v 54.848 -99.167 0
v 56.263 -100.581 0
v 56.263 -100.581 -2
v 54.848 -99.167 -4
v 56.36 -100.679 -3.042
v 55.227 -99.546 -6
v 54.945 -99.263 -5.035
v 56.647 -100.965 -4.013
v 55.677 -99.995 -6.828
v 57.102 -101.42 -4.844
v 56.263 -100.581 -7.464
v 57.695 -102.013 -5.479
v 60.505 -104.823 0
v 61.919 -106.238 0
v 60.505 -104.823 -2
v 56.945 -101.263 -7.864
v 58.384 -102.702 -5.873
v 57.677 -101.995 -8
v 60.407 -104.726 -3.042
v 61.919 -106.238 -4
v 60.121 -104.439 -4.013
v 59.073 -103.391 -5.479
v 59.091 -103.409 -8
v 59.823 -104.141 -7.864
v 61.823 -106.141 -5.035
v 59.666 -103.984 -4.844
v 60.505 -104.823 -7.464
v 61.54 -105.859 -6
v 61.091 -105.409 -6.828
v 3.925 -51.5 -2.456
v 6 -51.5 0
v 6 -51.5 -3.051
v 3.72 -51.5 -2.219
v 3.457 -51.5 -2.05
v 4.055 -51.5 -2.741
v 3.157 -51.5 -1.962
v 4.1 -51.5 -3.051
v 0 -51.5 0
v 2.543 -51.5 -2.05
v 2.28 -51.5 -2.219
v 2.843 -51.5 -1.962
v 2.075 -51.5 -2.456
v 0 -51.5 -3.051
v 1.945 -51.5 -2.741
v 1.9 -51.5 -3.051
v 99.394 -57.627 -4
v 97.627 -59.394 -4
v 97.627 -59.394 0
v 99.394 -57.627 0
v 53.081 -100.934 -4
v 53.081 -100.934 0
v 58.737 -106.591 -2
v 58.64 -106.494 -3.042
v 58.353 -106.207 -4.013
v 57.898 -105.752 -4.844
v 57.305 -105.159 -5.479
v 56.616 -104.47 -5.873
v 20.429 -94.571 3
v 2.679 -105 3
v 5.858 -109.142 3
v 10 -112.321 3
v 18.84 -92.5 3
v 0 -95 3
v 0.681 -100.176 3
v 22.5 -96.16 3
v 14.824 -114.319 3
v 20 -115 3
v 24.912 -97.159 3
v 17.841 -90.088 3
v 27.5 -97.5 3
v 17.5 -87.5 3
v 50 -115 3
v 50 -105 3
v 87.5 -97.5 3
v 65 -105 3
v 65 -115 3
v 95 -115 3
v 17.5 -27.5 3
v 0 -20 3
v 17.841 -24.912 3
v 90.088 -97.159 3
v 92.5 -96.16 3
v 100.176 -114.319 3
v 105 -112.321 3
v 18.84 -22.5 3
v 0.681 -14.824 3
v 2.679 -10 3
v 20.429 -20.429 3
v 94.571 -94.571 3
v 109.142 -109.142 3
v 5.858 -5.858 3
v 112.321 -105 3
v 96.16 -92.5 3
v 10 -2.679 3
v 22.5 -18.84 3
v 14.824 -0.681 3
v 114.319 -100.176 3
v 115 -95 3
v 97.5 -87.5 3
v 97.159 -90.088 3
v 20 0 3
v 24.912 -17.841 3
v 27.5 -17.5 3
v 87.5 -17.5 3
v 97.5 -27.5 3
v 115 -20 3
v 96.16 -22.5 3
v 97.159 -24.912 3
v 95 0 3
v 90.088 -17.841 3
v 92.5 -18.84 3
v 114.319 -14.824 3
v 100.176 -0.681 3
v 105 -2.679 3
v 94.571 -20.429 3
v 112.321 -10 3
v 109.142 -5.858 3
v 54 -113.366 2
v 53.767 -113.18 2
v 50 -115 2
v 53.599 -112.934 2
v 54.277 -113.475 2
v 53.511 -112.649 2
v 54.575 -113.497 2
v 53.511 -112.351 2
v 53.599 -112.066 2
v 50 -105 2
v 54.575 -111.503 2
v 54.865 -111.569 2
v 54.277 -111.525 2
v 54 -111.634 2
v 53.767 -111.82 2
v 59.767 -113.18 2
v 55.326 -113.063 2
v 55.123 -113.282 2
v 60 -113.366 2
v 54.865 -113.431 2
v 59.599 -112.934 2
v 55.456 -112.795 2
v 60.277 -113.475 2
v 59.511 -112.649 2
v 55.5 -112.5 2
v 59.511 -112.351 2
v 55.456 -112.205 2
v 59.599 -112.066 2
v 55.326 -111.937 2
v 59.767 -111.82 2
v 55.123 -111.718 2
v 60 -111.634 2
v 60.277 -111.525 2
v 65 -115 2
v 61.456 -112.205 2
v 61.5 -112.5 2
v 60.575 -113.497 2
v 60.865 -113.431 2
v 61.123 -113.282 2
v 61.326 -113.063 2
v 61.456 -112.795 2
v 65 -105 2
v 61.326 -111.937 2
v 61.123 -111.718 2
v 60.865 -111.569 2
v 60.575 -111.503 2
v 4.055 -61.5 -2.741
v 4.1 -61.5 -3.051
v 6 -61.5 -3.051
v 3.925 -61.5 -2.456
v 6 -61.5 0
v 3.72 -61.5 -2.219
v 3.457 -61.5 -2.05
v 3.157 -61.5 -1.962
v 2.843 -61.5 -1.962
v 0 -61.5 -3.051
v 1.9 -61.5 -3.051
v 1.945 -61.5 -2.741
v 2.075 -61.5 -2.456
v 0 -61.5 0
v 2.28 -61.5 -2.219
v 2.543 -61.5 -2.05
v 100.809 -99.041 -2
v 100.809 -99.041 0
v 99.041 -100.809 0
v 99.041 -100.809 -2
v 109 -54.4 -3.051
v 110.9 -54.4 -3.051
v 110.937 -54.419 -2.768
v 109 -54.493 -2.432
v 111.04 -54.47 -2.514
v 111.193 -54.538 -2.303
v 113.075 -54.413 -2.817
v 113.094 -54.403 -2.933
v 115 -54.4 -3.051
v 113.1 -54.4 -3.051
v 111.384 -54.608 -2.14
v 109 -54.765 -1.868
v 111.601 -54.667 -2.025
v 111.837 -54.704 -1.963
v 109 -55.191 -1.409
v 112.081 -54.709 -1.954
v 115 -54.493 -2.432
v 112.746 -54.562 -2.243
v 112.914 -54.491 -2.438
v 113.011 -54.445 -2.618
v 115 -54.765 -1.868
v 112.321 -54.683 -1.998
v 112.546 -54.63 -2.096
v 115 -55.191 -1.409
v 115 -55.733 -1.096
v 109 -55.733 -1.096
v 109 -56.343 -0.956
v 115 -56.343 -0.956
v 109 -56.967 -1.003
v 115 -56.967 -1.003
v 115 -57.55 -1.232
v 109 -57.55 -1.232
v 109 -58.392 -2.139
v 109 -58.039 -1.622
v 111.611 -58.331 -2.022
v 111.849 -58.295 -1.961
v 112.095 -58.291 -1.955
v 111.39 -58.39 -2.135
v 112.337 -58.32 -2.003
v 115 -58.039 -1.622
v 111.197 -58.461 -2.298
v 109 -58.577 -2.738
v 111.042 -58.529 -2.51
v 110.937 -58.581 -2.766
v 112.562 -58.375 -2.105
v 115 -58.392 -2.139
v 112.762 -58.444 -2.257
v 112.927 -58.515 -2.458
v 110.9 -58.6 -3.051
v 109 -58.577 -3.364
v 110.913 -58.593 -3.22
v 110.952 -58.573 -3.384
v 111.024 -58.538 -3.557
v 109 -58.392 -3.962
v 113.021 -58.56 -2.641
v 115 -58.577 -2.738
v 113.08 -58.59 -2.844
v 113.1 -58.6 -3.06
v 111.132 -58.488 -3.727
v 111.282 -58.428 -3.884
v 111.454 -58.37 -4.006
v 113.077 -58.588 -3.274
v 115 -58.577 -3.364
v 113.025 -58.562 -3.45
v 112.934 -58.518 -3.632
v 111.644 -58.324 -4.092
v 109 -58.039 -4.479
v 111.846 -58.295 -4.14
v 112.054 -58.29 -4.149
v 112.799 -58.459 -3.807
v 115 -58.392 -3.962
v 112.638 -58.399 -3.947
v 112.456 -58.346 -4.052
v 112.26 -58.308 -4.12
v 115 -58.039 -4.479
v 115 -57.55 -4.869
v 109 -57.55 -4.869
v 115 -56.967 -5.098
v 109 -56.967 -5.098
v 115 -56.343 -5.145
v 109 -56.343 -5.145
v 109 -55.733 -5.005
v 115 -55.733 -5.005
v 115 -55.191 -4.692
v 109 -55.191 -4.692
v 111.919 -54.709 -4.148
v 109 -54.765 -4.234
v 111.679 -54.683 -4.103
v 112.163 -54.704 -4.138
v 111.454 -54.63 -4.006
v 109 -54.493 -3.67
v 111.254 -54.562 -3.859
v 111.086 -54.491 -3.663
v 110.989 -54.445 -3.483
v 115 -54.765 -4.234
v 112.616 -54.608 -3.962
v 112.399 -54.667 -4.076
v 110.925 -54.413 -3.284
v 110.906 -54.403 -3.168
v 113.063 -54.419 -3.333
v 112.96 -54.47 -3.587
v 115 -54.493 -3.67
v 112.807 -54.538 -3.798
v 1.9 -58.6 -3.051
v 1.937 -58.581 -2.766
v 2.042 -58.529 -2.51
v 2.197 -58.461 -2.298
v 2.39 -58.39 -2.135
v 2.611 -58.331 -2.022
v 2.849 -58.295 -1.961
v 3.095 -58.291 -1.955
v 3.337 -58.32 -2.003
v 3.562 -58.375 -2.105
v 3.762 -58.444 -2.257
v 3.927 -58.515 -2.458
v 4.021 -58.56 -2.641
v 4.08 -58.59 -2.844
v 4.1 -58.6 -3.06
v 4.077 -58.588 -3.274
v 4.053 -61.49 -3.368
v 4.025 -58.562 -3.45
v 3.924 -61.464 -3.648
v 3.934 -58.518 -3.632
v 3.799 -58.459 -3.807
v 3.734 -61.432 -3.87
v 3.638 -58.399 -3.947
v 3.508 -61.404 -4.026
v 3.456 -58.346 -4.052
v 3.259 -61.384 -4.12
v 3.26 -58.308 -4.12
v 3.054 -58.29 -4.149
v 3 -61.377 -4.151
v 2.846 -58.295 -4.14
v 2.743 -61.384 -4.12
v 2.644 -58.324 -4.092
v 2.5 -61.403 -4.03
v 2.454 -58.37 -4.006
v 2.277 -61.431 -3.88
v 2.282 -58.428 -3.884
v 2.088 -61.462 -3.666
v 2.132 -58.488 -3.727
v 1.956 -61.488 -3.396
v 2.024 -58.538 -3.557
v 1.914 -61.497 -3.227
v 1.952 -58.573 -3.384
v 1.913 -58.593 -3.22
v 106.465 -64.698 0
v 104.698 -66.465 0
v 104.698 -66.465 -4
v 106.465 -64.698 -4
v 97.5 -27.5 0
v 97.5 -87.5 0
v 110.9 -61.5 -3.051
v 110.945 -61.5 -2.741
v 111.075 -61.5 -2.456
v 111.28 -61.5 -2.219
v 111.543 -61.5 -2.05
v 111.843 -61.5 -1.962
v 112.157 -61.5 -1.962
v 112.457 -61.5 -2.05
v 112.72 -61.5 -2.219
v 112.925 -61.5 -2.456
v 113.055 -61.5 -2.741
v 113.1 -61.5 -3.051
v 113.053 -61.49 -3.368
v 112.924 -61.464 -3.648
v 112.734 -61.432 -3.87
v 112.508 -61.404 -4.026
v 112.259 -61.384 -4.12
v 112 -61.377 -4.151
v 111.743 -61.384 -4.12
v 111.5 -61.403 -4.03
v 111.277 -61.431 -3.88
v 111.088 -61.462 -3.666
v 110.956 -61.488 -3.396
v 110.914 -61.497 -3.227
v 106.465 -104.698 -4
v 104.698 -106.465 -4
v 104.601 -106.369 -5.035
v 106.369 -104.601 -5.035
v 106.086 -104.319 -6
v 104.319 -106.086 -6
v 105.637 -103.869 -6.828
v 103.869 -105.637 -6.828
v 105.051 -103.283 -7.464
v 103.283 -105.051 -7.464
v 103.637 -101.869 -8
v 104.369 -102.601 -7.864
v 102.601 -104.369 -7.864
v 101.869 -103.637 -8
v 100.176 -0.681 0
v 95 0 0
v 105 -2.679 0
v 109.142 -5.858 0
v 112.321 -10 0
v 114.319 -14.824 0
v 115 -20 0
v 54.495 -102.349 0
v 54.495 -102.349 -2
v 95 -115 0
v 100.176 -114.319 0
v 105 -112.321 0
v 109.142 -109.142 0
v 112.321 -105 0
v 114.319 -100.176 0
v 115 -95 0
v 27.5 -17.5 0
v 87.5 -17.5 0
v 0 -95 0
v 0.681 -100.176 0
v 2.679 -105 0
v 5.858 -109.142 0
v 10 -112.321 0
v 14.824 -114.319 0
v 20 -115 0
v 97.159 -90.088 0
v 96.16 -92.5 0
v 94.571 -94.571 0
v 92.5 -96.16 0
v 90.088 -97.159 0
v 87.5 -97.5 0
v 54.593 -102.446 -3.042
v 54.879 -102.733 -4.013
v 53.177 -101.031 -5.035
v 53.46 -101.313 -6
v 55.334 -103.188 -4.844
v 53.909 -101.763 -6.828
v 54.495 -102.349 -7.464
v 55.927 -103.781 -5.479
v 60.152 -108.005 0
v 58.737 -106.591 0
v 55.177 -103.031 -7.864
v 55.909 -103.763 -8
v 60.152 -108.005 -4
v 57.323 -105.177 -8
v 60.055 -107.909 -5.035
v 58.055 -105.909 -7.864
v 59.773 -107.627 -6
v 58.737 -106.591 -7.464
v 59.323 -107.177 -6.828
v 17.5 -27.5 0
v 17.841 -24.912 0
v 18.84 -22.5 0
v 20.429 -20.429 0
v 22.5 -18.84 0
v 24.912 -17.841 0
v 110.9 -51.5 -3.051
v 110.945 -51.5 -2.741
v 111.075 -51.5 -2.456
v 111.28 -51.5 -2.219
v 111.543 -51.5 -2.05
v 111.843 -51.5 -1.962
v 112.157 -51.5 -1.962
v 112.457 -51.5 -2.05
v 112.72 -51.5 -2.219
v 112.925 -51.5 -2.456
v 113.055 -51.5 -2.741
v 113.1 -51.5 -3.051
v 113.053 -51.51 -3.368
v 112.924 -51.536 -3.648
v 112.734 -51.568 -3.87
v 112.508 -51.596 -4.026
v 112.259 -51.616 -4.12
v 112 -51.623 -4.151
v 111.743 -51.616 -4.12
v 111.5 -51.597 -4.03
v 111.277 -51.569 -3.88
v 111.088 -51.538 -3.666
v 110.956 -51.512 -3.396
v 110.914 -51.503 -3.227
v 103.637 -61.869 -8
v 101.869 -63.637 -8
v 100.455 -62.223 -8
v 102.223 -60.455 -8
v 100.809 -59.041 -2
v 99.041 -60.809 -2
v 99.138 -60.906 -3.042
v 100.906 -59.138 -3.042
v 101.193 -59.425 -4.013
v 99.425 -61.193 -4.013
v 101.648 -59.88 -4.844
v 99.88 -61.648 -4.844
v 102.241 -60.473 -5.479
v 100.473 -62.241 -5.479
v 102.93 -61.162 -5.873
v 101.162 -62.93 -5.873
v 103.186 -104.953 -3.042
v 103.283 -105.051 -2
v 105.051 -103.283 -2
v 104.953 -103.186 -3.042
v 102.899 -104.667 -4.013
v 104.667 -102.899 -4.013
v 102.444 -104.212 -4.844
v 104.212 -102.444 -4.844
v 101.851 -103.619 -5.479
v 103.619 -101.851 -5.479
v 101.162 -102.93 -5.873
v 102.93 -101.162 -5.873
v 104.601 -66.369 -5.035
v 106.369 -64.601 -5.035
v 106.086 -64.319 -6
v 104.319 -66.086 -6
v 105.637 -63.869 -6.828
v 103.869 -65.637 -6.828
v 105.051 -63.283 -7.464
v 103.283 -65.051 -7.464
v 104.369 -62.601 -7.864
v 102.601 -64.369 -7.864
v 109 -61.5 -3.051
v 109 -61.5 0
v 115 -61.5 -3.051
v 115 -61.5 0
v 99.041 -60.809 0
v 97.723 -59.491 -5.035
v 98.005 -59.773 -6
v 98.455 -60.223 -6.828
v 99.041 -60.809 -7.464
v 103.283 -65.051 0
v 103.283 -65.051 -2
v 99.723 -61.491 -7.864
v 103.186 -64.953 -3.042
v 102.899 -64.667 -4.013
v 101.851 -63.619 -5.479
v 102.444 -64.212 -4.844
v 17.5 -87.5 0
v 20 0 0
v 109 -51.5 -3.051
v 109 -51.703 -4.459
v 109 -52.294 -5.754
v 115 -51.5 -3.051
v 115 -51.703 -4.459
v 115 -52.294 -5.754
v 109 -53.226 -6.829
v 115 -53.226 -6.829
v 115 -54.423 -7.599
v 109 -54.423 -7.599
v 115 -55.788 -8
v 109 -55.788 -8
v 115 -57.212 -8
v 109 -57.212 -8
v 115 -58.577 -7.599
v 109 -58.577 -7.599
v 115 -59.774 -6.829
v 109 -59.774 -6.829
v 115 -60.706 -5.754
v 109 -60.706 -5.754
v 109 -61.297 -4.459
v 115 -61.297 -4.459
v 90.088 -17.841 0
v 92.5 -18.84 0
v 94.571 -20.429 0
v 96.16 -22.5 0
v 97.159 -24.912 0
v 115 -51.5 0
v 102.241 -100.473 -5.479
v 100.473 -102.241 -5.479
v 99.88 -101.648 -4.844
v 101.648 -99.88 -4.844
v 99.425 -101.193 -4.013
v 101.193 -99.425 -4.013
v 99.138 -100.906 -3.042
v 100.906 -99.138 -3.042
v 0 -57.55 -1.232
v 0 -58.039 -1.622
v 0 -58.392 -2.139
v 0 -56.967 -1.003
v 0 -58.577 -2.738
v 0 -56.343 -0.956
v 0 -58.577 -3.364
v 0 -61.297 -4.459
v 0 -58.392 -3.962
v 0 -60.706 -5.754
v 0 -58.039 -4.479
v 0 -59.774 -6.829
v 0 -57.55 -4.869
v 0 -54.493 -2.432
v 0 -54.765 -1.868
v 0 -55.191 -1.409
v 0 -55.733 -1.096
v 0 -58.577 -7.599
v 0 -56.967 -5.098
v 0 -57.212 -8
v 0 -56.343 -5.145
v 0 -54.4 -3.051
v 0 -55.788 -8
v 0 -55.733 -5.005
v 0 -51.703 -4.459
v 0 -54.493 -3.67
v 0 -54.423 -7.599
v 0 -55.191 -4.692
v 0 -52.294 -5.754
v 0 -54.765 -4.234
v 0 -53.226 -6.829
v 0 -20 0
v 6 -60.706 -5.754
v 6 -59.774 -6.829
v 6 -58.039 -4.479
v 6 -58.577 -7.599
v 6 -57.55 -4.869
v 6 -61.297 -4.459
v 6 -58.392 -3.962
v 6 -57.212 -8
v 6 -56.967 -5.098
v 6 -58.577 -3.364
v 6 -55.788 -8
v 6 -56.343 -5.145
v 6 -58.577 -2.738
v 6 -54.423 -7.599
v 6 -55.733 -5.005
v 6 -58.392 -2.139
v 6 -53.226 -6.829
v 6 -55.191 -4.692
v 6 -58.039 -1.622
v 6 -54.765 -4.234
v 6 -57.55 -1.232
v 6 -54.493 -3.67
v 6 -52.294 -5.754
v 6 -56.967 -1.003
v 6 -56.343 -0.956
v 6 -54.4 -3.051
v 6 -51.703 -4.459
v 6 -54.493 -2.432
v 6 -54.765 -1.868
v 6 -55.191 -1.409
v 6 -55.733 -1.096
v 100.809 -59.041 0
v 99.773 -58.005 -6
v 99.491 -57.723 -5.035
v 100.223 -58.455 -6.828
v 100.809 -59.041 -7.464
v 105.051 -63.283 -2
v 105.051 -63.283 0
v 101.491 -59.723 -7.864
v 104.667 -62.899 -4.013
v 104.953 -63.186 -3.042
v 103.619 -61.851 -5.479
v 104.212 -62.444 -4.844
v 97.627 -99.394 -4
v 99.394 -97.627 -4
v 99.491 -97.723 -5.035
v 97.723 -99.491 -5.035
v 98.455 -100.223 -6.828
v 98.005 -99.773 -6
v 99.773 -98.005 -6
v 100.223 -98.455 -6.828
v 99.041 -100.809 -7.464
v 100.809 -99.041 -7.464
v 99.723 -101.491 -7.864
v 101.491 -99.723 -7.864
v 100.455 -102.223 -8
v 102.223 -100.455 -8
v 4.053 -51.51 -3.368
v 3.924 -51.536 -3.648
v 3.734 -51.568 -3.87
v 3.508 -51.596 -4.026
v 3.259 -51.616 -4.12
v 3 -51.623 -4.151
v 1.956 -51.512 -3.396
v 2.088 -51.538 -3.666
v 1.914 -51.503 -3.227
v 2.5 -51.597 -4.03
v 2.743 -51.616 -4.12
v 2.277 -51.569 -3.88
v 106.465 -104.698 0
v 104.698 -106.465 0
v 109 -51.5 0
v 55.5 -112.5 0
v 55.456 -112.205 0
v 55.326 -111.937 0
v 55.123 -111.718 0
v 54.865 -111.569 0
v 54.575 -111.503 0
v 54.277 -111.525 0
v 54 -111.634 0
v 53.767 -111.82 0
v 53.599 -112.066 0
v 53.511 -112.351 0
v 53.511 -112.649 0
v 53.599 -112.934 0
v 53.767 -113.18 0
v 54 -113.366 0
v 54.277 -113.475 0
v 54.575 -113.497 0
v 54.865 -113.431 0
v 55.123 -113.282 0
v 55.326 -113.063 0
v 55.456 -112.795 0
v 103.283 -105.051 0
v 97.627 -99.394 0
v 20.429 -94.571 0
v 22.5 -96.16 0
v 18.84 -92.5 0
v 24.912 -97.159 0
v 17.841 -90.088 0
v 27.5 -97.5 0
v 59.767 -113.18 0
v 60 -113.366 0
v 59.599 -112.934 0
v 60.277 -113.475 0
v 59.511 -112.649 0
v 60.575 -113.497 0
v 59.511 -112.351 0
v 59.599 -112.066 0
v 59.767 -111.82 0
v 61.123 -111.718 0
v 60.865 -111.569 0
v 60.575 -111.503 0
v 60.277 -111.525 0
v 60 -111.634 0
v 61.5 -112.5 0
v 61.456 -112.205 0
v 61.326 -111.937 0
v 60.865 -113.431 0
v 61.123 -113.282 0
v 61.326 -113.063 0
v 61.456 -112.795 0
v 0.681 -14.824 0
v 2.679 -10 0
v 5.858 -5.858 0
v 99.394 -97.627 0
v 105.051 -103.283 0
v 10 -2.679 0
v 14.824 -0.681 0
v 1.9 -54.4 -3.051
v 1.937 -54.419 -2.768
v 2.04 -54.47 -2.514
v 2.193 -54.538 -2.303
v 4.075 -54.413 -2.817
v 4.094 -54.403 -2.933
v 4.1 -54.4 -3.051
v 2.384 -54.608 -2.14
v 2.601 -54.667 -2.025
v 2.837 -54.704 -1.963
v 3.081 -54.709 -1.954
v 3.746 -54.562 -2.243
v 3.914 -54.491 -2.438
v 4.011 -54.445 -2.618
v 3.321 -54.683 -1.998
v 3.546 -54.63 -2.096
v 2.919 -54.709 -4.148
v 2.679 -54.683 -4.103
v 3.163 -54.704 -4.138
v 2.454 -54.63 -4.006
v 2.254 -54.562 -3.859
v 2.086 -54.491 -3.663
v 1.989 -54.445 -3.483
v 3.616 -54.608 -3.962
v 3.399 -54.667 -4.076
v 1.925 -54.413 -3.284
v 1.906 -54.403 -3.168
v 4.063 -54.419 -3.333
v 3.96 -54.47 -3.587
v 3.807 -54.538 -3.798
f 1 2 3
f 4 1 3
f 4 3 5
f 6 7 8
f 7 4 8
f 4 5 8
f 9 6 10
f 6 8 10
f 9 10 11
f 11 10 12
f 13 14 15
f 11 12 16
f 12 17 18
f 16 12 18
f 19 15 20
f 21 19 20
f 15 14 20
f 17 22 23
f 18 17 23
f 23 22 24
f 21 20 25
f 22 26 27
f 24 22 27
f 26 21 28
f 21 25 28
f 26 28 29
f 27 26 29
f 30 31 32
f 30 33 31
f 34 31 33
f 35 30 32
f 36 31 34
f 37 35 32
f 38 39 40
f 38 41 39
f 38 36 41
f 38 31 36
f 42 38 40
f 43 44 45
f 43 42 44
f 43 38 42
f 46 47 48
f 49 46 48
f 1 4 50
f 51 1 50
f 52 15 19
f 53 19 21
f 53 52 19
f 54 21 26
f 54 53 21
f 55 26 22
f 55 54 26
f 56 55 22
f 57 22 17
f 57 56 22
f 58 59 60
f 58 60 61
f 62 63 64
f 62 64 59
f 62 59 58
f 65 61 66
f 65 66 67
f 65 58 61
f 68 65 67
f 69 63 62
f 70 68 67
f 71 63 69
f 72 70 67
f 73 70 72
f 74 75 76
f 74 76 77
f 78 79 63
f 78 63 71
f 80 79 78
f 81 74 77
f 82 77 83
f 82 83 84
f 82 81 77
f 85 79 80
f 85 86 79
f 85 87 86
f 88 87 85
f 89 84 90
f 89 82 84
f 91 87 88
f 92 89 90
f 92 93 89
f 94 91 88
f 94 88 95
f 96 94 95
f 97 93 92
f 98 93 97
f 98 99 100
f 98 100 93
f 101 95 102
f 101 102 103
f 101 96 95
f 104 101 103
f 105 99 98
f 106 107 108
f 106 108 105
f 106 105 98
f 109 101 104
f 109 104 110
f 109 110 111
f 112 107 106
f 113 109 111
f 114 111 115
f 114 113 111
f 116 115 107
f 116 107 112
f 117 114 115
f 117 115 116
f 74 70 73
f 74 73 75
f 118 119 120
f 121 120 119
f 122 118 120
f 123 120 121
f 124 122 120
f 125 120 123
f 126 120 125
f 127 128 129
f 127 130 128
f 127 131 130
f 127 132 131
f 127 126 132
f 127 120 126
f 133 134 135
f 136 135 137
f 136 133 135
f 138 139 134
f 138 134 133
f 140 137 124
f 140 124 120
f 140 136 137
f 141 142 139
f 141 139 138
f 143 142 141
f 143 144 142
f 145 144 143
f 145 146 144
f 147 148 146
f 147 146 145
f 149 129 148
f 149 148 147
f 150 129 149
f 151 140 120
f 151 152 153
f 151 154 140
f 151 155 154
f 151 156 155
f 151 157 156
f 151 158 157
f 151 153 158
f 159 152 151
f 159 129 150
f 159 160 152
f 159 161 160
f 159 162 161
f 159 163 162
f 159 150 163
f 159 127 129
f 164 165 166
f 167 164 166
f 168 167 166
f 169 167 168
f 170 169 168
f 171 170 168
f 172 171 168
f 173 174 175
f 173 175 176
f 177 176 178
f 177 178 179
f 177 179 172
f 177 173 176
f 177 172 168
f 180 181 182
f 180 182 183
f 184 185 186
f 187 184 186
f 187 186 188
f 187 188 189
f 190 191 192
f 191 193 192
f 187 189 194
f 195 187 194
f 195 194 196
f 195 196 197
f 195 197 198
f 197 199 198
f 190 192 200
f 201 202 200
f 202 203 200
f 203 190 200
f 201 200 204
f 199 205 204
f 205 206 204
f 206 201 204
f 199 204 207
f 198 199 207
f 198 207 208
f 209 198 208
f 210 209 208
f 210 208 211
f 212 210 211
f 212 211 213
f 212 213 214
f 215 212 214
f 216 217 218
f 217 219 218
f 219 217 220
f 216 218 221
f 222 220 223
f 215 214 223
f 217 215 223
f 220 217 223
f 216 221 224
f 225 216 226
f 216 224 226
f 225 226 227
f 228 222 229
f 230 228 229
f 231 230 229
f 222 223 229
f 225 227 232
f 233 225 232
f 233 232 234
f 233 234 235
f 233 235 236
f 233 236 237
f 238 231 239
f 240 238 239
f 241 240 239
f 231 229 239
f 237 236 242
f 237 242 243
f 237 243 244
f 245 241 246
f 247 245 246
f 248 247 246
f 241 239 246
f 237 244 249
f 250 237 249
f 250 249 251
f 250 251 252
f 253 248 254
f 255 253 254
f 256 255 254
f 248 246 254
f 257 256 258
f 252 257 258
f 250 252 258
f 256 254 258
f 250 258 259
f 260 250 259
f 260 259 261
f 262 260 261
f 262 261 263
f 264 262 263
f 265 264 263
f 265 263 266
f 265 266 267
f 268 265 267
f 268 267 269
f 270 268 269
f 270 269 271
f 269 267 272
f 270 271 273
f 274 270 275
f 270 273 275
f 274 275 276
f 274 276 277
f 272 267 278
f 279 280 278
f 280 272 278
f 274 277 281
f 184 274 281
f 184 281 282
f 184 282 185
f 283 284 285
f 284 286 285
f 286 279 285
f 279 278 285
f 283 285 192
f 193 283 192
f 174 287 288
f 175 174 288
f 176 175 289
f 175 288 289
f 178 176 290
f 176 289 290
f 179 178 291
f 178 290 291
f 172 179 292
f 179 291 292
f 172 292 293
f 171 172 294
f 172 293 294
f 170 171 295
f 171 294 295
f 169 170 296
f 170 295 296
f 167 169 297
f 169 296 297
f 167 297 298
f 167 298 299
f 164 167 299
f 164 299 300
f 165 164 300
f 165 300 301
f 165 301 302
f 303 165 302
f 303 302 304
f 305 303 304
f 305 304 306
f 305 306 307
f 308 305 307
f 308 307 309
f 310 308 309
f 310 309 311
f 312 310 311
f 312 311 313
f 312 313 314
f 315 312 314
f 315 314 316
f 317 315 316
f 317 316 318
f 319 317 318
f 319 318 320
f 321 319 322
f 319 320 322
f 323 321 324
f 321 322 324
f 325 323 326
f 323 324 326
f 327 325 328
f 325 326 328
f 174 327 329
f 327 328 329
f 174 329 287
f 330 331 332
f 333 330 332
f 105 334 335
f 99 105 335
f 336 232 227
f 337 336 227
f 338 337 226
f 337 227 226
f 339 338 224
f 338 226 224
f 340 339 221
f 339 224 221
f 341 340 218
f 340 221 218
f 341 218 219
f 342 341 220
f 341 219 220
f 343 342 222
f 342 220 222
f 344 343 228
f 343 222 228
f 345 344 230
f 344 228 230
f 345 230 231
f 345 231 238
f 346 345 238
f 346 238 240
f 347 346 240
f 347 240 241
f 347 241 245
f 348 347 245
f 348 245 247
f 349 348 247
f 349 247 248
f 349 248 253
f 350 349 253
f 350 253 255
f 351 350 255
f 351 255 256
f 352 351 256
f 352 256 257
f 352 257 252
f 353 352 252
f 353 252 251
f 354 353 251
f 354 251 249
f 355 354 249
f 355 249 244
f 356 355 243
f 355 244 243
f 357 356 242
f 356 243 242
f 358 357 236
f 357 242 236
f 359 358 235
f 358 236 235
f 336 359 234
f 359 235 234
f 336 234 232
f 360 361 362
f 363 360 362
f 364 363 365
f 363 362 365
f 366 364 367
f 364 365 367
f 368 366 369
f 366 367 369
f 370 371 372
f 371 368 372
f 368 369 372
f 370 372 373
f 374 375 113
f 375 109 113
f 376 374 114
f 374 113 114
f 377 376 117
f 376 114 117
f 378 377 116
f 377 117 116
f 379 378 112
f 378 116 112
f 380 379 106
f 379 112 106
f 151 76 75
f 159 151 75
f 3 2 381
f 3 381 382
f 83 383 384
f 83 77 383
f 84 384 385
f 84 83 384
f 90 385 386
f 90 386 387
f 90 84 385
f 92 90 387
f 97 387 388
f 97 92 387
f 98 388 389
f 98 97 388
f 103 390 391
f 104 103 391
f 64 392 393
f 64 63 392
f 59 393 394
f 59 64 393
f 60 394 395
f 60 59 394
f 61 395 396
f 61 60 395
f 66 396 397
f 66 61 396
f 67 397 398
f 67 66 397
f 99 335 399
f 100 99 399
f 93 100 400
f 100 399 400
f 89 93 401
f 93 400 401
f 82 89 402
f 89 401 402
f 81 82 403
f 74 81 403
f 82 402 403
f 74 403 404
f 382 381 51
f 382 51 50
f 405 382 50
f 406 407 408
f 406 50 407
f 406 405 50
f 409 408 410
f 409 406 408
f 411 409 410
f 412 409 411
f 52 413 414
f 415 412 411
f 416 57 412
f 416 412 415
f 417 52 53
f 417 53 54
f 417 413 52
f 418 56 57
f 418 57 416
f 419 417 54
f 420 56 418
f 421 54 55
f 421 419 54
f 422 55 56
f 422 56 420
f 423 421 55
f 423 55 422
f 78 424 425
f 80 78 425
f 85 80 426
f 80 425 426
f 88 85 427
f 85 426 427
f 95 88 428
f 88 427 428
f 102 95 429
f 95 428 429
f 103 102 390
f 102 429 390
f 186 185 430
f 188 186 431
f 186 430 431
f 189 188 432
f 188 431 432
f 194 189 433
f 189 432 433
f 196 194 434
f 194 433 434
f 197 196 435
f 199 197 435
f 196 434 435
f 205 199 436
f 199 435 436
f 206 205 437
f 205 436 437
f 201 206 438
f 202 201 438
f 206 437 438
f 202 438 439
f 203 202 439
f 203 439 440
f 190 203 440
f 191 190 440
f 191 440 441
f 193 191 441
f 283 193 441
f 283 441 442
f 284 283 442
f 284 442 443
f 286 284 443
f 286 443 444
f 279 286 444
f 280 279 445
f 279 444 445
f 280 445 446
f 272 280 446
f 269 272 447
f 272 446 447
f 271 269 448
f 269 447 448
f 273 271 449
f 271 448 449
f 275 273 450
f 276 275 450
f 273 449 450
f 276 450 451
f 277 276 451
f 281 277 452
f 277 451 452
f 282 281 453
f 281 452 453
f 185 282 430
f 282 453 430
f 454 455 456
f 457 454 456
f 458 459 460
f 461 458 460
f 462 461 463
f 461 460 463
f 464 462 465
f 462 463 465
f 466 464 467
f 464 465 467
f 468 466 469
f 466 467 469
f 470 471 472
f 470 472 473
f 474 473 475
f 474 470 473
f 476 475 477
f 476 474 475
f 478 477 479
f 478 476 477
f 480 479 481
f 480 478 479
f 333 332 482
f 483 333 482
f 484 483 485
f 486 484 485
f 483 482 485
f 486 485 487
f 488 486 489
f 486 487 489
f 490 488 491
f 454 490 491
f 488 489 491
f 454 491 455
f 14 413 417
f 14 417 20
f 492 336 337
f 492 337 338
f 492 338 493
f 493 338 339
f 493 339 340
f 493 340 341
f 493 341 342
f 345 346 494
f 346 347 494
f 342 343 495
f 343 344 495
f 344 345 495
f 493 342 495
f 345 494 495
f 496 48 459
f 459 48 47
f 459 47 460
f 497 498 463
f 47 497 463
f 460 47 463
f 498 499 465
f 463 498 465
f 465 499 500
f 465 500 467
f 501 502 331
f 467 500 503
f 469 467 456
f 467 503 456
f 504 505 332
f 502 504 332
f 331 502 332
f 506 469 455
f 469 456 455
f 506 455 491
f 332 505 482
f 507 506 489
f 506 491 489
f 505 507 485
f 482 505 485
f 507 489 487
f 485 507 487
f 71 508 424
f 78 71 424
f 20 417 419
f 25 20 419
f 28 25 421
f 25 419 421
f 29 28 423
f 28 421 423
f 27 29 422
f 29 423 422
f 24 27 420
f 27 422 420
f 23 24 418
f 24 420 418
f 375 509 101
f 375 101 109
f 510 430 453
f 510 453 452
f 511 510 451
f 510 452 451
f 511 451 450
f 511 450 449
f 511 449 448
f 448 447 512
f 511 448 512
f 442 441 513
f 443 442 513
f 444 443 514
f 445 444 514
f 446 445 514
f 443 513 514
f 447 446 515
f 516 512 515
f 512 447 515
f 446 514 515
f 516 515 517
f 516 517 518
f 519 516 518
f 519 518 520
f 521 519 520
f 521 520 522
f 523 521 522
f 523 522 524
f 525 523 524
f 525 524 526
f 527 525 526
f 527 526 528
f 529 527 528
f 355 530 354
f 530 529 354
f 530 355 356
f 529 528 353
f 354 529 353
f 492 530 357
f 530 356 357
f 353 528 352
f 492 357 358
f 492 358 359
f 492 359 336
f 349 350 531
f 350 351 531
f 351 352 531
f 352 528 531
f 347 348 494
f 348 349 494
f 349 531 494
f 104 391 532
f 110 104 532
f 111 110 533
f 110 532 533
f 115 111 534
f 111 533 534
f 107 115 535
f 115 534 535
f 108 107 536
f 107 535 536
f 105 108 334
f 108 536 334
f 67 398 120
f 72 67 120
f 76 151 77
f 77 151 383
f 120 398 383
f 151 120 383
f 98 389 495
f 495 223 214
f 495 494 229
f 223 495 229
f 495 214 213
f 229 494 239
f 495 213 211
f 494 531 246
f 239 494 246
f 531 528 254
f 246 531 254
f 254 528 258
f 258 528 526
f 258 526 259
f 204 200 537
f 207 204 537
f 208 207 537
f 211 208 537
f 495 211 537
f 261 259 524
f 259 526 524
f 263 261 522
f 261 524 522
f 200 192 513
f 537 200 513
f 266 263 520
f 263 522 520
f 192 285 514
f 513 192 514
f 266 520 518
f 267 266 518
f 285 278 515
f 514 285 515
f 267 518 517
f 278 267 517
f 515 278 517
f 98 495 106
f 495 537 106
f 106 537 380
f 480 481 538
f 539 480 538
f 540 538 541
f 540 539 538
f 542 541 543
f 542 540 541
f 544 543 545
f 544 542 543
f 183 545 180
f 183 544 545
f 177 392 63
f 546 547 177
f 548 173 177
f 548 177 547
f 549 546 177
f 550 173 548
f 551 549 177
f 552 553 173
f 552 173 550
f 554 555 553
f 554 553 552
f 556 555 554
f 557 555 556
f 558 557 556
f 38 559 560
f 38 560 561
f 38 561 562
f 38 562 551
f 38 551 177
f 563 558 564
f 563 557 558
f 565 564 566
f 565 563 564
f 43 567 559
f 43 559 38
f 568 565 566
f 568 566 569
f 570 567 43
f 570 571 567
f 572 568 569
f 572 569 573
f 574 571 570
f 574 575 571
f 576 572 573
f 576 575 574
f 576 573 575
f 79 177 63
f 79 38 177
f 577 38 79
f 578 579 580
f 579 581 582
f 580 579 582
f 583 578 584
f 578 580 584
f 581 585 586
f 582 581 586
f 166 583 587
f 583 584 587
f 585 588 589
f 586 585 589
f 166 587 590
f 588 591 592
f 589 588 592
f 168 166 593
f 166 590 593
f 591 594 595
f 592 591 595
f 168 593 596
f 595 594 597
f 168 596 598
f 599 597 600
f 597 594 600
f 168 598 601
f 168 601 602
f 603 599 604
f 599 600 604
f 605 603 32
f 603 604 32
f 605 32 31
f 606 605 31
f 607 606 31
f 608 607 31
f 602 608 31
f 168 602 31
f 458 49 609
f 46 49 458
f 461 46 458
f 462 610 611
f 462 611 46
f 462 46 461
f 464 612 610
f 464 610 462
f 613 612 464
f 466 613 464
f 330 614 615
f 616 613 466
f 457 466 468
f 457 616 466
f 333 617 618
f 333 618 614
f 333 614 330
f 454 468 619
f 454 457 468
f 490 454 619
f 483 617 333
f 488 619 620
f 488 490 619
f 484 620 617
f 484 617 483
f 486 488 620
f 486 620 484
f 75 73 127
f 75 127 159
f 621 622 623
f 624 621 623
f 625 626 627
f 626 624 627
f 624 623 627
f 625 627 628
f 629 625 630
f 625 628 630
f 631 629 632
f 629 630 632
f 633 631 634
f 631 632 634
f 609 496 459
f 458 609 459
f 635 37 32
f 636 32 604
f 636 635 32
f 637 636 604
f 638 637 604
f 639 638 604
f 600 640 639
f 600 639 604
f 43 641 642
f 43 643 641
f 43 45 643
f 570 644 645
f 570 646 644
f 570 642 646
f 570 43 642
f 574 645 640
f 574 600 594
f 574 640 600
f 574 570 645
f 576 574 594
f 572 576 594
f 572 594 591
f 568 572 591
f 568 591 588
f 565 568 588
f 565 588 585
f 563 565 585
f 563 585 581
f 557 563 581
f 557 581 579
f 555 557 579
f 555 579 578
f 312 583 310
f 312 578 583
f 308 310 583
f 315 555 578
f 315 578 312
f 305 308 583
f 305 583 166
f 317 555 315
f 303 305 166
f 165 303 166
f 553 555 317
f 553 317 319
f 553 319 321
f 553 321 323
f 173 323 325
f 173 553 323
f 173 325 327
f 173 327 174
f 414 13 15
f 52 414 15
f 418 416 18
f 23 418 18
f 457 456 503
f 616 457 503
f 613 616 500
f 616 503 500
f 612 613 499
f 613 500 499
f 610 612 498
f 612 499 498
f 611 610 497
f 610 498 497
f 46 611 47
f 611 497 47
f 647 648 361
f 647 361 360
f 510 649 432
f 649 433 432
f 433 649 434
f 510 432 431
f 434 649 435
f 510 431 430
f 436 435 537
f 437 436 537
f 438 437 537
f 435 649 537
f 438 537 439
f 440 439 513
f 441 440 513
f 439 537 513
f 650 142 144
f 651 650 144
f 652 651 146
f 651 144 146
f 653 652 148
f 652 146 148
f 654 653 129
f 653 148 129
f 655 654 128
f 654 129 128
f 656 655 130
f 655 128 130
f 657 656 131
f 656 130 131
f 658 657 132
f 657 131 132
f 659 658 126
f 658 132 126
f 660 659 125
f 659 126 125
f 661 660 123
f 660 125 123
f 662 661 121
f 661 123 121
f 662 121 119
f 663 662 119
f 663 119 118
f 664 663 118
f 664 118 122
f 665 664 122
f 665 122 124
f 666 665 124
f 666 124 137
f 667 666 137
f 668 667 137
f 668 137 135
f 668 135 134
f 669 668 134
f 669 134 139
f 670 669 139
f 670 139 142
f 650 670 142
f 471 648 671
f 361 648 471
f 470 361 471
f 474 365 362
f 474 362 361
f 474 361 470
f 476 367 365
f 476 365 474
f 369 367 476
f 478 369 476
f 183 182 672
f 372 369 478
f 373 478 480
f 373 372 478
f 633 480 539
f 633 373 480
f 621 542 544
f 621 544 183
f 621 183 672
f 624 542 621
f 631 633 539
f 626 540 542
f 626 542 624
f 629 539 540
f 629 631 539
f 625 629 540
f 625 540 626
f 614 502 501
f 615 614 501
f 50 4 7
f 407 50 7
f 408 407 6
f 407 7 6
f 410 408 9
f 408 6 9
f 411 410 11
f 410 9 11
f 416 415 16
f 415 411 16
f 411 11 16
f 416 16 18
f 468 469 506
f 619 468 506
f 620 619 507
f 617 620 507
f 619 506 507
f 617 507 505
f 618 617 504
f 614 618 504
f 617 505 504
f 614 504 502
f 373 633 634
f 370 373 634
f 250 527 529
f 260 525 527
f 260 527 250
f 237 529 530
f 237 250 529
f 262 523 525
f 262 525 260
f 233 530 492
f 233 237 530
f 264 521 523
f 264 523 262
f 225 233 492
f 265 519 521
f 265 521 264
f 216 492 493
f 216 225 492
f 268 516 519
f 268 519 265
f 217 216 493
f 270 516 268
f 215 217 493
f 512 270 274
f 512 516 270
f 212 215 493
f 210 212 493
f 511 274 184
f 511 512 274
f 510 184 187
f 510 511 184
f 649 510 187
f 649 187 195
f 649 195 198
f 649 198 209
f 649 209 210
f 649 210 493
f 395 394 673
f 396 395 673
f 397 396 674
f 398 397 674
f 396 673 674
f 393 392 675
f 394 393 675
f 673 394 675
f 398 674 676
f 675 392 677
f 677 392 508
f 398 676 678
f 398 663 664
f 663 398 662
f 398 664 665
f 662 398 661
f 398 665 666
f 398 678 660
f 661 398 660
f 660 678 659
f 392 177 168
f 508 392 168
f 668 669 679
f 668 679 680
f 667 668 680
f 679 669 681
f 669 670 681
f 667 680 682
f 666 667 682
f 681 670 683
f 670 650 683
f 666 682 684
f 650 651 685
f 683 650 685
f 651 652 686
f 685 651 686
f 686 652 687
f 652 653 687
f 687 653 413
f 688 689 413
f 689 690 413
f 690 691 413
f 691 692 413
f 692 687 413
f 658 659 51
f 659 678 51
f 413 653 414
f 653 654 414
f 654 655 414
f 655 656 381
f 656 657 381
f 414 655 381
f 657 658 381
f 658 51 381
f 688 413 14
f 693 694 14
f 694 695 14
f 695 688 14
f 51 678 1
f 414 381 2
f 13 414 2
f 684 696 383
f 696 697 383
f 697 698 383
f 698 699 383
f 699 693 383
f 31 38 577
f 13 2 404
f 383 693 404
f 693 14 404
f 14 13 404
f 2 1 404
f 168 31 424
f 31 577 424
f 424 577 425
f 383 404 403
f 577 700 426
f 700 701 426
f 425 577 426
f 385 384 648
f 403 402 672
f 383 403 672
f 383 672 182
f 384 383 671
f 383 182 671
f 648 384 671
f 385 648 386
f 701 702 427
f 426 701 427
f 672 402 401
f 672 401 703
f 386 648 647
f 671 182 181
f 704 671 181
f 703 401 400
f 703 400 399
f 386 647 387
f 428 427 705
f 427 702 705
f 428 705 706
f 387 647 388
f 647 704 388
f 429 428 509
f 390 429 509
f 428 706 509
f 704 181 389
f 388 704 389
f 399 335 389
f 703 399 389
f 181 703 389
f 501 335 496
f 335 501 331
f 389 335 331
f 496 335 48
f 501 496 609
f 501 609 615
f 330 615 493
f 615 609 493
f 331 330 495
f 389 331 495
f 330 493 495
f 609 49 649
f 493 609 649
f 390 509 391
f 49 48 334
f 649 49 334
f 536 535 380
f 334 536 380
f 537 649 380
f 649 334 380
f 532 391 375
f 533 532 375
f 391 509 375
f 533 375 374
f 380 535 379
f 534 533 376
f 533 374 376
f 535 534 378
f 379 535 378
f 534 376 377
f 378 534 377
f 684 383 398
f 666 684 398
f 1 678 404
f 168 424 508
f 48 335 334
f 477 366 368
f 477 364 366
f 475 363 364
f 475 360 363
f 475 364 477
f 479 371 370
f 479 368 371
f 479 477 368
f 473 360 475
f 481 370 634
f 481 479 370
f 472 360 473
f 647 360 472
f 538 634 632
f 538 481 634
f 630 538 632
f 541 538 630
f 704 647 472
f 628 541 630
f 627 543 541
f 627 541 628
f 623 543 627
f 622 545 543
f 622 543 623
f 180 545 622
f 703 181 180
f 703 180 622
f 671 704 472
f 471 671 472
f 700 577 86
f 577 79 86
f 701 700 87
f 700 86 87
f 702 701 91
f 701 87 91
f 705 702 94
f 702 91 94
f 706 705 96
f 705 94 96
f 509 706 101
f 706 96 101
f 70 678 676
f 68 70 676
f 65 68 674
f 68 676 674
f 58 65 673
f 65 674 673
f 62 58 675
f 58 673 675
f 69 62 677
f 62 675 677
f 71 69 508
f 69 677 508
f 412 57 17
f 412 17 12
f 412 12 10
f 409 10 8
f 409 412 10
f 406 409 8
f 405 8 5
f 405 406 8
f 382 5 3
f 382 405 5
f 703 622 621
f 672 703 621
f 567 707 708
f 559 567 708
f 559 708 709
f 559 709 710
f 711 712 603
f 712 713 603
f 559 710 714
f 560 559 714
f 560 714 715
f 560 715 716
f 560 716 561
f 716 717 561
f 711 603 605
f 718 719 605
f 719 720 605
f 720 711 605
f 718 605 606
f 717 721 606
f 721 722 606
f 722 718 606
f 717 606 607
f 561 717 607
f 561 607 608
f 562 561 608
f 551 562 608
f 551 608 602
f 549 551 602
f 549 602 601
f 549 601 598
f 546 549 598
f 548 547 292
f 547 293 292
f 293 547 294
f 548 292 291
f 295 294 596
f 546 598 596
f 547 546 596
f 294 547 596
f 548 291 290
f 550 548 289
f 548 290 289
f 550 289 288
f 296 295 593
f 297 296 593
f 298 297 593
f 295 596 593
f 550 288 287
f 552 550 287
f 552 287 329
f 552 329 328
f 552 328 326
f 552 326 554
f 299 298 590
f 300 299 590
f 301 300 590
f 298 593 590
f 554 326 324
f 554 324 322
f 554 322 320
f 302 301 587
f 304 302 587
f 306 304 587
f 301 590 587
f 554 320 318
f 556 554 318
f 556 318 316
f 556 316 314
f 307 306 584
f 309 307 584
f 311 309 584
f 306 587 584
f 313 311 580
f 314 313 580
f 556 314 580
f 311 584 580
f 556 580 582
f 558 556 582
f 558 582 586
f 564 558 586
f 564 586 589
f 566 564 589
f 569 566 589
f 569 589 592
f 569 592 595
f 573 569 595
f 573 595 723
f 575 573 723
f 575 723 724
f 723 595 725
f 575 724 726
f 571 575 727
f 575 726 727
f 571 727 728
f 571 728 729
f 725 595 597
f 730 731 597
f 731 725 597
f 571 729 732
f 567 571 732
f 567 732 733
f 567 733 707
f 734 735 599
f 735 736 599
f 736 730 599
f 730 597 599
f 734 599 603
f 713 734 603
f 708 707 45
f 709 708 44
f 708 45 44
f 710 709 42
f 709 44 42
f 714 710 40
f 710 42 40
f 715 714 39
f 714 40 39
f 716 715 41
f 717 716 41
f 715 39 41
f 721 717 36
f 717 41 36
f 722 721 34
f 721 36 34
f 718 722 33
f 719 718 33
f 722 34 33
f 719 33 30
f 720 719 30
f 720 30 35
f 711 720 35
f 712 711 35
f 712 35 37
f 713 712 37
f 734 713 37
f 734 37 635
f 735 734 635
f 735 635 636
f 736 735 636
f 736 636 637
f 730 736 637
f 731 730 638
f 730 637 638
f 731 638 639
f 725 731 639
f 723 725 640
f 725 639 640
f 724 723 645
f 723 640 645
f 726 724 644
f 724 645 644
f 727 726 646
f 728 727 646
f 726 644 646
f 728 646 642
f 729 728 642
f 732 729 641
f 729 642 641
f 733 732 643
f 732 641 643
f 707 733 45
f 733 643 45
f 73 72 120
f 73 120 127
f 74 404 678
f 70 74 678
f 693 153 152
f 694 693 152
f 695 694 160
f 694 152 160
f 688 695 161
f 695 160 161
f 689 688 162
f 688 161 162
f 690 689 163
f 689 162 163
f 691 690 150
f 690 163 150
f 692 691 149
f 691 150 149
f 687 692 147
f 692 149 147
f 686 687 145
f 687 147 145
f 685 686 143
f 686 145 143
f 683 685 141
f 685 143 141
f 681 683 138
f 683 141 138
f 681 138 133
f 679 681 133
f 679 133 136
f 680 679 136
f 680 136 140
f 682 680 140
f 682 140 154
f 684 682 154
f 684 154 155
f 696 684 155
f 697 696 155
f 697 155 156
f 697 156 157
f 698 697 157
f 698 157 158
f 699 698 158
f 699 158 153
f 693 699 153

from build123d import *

# Parameters (mm, degrees)
SZKIC1_W                    = 115
SZKIC1_H                    = 115
DODANIE_WYCI_GNI_CIE1_DEPTH = 3
DODANIE_WYCI_GNI_CIE2_DEPTH = 6
SZKIC5_R                    = 2.1
WYTNIJ_WYCI_GNI_CIE1_DEPTH  = 163.833695476
SZKIC6_R                    = 1
WYTNIJ_WYCI_GNI_CIE2_DEPTH  = 10
ZAOKR_GLENIE1_R             = 20
SZKIC7_W                    = 15
SZKIC7_H                    = 10
WYTNIJ_WYCI_GNI_CIE3_DEPTH  = 1
WYTNIJ_WYCI_GNI_CIE4_DEPTH  = 10
SZKIC9_R                    = 1.1
WYTNIJ_WYCI_GNI_CIE5_DEPTH  = 132.613306252
SZKIC10_R                   = 1.1
WYTNIJ_WYCI_GNI_CIE6_DEPTH  = 10
DODANIE_WYCI_GNI_CIE4_DEPTH = 8
SZKIC14_W                   = 6
SZKIC14_H                   = 6
WYTNIJ_WYCI_GNI_CIE8_DEPTH  = 8
ZAOKR_GLENIE3_R             = 4
DODANIE_WYCI_GNI_CIE5_DEPTH = 8
SZKIC16_W                   = 6
SZKIC16_H                   = 6
WYTNIJ_WYCI_GNI_CIE9_DEPTH  = 8
ZAOKR_GLENIE5_R             = 4
SZYK_START                  = 27.034271247
SZYK_LINIOWY1_DEPTH         = 2.5


# Read off the part's stored shape, not the designer's step: Szyk liniowy1
with BuildPart() as part:
    # Szkic1 → Dodanie-wyciągnięcie1 (new body)
    with BuildSketch(Plane.XY):
        with Locations((57.5, -57.5)):
            Rectangle(SZKIC1_W, SZKIC1_H)
    extrude(amount=DODANIE_WYCI_GNI_CIE1_DEPTH)

    # Szkic3 → Dodanie-wyciągnięcie2 (add)
    with BuildSketch(Plane(origin=(115, 0, 0), x_dir=(0, 0, -1), z_dir=(1, 0, 0))):
        with BuildLine():
            Line((0, -51.5), (3.050613798, -51.5))
            ThreePointArc((3.050613798, -51.5), (8.050613798, -56.5), (3.050613798, -61.5))
            Line((3.050613798, -61.5), (0, -61.5))
            Line((0, -61.5), (0, -51.5))
        make_face()
    dodanie_wyci_gni_cie2 = extrude(amount=-DODANIE_WYCI_GNI_CIE2_DEPTH)

    # Lustro1: Dodanie-wyciągnięcie2 across plane
    add(dodanie_wyci_gni_cie2.mirror(Plane(origin=(57.5, 0, 0), x_dir=(0, 0, 1), z_dir=(1, 0, 0))))

    # Szkic5 → Wytnij-wyciągnięcie1 (cut, through all)
    with BuildSketch(Plane(origin=(115, 0, 0), x_dir=(0, 0, -1), z_dir=(1, 0, 0))):
        with Locations(Location((3.050613798, -56.5, 0), (0, 0, 90))):
            Circle(SZKIC5_R)
    extrude(amount=-WYTNIJ_WYCI_GNI_CIE1_DEPTH, mode=Mode.SUBTRACT)

    # Szkic6 → Wytnij-wyciągnięcie2 (cut)
    with BuildSketch(Plane.XY.offset(3)):
        with Locations((54.5, -112.5)):
            Circle(SZKIC6_R)
        with Locations((60.5, -112.5)):
            Circle(SZKIC6_R)
    extrude(amount=-WYTNIJ_WYCI_GNI_CIE2_DEPTH, mode=Mode.SUBTRACT)

    # Zaokrąglenie1
    zaokr_glenie1_edges = [part.edges().sort_by_distance(p)[0] for p in [
        (0, 0, 1.5),
        (115, 0, 1.5),
        (115, -115, 1.5),
        (0, -115, 1.5),
    ]]
    fillet(zaokr_glenie1_edges, radius=ZAOKR_GLENIE1_R)

    # Szkic7 → Wytnij-wyciągnięcie3 (cut)
    with BuildSketch(Plane.XY.offset(3)):
        with Locations((57.5, -110)):
            Rectangle(SZKIC7_W, SZKIC7_H)
    extrude(amount=-WYTNIJ_WYCI_GNI_CIE3_DEPTH, mode=Mode.SUBTRACT)

    # Szkic8 → Wytnij-wyciągnięcie4 (cut)
    with BuildSketch(Plane(origin=(0, 0, 0), x_dir=(-1, 0, 0), z_dir=(0, 0, -1))):
        with BuildLine():
            Line((-87.5, -97.5), (-27.5, -97.5))
            ThreePointArc((-27.5, -97.5), (-20.428932188, -94.571067812), (-17.5, -87.5))
            Line((-17.5, -87.5), (-17.5, -27.5))
            ThreePointArc((-17.5, -27.5), (-20.428932188, -20.428932188), (-27.5, -17.5))
            Line((-27.5, -17.5), (-87.5, -17.5))
            ThreePointArc((-87.5, -17.5), (-94.571067812, -20.428932188), (-97.5, -27.5))
            Line((-97.5, -27.5), (-97.5, -87.5))
            ThreePointArc((-97.5, -87.5), (-94.571067812, -94.571067812), (-87.5, -97.5))
        make_face()
    extrude(amount=-WYTNIJ_WYCI_GNI_CIE4_DEPTH, mode=Mode.SUBTRACT)

    # Szkic9 → Wytnij-wyciągnięcie5 (cut, through all)
    with BuildSketch(Plane(origin=(0, -51.5, 0), x_dir=(1, 0, 0), z_dir=(0, 1, 0))):
        with Locations(Location((3, 3.050613798, 0), (0, 0, 180))):
            Circle(SZKIC9_R)
    extrude(amount=-WYTNIJ_WYCI_GNI_CIE5_DEPTH, mode=Mode.SUBTRACT)

    # Szkic10 → Wytnij-wyciągnięcie6 (cut)
    with BuildSketch(Plane(origin=(0, -51.5, 0), x_dir=(1, 0, 0), z_dir=(0, 1, 0))):
        with Locations(Location((112, 3.050613798, 0), (0, 0, 180))):
            Circle(SZKIC10_R)
    extrude(amount=-WYTNIJ_WYCI_GNI_CIE6_DEPTH, mode=Mode.SUBTRACT)

    # Szkic13 → Dodanie-wyciągnięcie4 (add)
    with BuildSketch(Plane(origin=(0, 2.663945597, 0), x_dir=(-1, 0, 0), z_dir=(0, 0, -1))):
        Polygon((-53.080582618, -103.598349571), (-60.151650429, -110.669417382), (-61.919417382, -108.901650429), (-54.848349571, -101.830582618), align=None)
    extrude(amount=DODANIE_WYCI_GNI_CIE4_DEPTH)

    # Szkic14 → Wytnij-wyciągnięcie8 (cut)
    with BuildSketch(Plane(origin=(-25.258883476, -22.594937879, 0), x_dir=(-0.7071067811865481, 0.707106781186547, 0), z_dir=(-0.707106781186547, -0.7071067811865481, 0))):
        with Locations((-115.788735419, 3)):
            Rectangle(SZKIC14_W, SZKIC14_H)
    extrude(amount=-WYTNIJ_WYCI_GNI_CIE8_DEPTH, mode=Mode.SUBTRACT)

    # Zaokrąglenie3
    # the kernel refuses this fillet: 4 mm, written as the material it adds along each edge
    with BuildSketch(Plane(origin=(58.737436867, -106.591258223, -6), x_dir=(0, 0, 1), z_dir=(0.707106781186547, 0.7071067811865481, 0)), Plane(origin=(54.49479618, -102.348617536, -6), x_dir=(0.7071067811865481, -0.707106781186547, 0), z_dir=(0.707106781186547, 0.7071067811865481, 0))) as zaokr_glenie3_piece_1:
        with BuildLine():
            CenterArc((ZAOKR_GLENIE3_R, -ZAOKR_GLENIE3_R), ZAOKR_GLENIE3_R, 90, 90)
            Line((0, -ZAOKR_GLENIE3_R), (0, 0))
            Line((0, 0), (ZAOKR_GLENIE3_R, 0))
        make_face()
    extrude(amount=2.5)
    # the kernel refuses this fillet: 4 mm, written as the material it takes off along each edge
    with BuildSketch(Plane(origin=(53.080582618, -115.076539597, -8), x_dir=(0, 0, 1), z_dir=(0.7071067811865476, 0.7071067811865476, 0)), Plane(origin=(61.919417382, -92.095569208, -8), x_dir=(0, 0, 1), z_dir=(-0.7071067811865476, -0.7071067811865476, 0))) as zaokr_glenie3_2_piece_1:
        with BuildLine():
            CenterArc((ZAOKR_GLENIE3_R, -ZAOKR_GLENIE3_R), ZAOKR_GLENIE3_R, 90, 90)
            Line((0, -ZAOKR_GLENIE3_R), (0, 0))
            Line((0, 0), (ZAOKR_GLENIE3_R, 0))
        make_face()
    extrude(amount=22.5, mode=Mode.SUBTRACT)

    # Szkic15 → Dodanie-wyciągnięcie5 (add)
    with BuildSketch(Plane(origin=(0, 0, 0), x_dir=(-1, 0, 0), z_dir=(0, 0, -1))):
        Polygon((-104.697591975, -106.465358928), (-106.465358928, -104.697591975), (-99.394291117, -97.626524164), (-97.626524164, -99.394291117), align=None)
    extrude(amount=DODANIE_WYCI_GNI_CIE5_DEPTH)

    # Szkic16 → Wytnij-wyciągnięcie9 (cut)
    with BuildSketch(Plane(origin=(-0.883883476, -0.883883476, 0), x_dir=(-0.7071067811865475, 0.7071067811865477, 0), z_dir=(-0.7071067811865477, -0.7071067811865475, 0))):
        with Locations((-144.31475452, 3)):
            Rectangle(SZKIC16_W, SZKIC16_H)
    extrude(amount=-WYTNIJ_WYCI_GNI_CIE9_DEPTH, mode=Mode.SUBTRACT)

    # Zaokrąglenie5
    # the kernel refuses this fillet: 4 mm, written as the material it adds along each edge
    with BuildSketch(Plane(origin=(99.040737726, -100.808504679, -6), x_dir=(0.7071067811865475, -0.7071067811865477, 0), z_dir=(0.7071067811865477, 0.7071067811865475, 0)), Plane(origin=(103.283378413, -105.051145366, -6), x_dir=(0, 0, 1), z_dir=(0.7071067811865477, 0.7071067811865475, 0))) as zaokr_glenie5_piece_1:
        with BuildLine():
            CenterArc((ZAOKR_GLENIE5_R, -ZAOKR_GLENIE5_R), ZAOKR_GLENIE5_R, 90, 90)
            Line((0, -ZAOKR_GLENIE5_R), (0, 0))
            Line((0, 0), (ZAOKR_GLENIE5_R, 0))
        make_face()
    extrude(amount=2.5)
    # the kernel refuses this fillet: 4 mm, written as the material it takes off along each edge
    with BuildSketch(Plane(origin=(106.465358928, -90.555456352, -8), x_dir=(0, 0, 1), z_dir=(-0.7071067811865476, -0.7071067811865476, 0)), Plane(origin=(97.626524164, -113.53642674, -8), x_dir=(0, 0, 1), z_dir=(0.7071067811865476, 0.7071067811865476, 0))) as zaokr_glenie5_2_piece_1:
        with BuildLine():
            CenterArc((ZAOKR_GLENIE5_R, -ZAOKR_GLENIE5_R), ZAOKR_GLENIE5_R, 90, 90)
            Line((0, -ZAOKR_GLENIE5_R), (0, 0))
            Line((0, 0), (ZAOKR_GLENIE5_R, 0))
        make_face()
    extrude(amount=22.5, mode=Mode.SUBTRACT)

    # Szyk liniowy1 outline → Szyk liniowy1 (add)
    with BuildSketch(Plane(origin=(0, 0, 0), x_dir=(0.7071067811865471, -0.707106781186548, 0), z_dir=(0.707106781186548, 0.707106781186547, 0)).offset(SZYK_START)):
        with BuildLine():
            ThreePointArc((121.030483272, 4), (119.858910397, 6.828427125), (117.030483272, 8))
            Line((117.030483272, 8), (115.030483272, 8))
            ThreePointArc((115.030483272, 8), (112.202056147, 6.828427125), (111.030483272, 4))
            Line((111.030483272, 4), (111.030483272, 0))
            Line((111.030483272, 0), (113.030483272, 0))
            Line((113.030483272, 0), (113.030483272, 2))
            ThreePointArc((113.030483272, 2), (113.868205612, 4.449489743), (116.030483272, 5.872983346))
            ThreePointArc((116.030483272, 5.872983346), (118.192760932, 4.449489743), (119.030483272, 2))
            Line((119.030483272, 2), (119.030483272, 0))
            Line((119.030483272, 0), (121.030483272, 0))
            Line((121.030483272, 0), (121.030483272, 4))
        make_face()
    extrude(amount=SZYK_LINIOWY1_DEPTH)


solid = part.part
